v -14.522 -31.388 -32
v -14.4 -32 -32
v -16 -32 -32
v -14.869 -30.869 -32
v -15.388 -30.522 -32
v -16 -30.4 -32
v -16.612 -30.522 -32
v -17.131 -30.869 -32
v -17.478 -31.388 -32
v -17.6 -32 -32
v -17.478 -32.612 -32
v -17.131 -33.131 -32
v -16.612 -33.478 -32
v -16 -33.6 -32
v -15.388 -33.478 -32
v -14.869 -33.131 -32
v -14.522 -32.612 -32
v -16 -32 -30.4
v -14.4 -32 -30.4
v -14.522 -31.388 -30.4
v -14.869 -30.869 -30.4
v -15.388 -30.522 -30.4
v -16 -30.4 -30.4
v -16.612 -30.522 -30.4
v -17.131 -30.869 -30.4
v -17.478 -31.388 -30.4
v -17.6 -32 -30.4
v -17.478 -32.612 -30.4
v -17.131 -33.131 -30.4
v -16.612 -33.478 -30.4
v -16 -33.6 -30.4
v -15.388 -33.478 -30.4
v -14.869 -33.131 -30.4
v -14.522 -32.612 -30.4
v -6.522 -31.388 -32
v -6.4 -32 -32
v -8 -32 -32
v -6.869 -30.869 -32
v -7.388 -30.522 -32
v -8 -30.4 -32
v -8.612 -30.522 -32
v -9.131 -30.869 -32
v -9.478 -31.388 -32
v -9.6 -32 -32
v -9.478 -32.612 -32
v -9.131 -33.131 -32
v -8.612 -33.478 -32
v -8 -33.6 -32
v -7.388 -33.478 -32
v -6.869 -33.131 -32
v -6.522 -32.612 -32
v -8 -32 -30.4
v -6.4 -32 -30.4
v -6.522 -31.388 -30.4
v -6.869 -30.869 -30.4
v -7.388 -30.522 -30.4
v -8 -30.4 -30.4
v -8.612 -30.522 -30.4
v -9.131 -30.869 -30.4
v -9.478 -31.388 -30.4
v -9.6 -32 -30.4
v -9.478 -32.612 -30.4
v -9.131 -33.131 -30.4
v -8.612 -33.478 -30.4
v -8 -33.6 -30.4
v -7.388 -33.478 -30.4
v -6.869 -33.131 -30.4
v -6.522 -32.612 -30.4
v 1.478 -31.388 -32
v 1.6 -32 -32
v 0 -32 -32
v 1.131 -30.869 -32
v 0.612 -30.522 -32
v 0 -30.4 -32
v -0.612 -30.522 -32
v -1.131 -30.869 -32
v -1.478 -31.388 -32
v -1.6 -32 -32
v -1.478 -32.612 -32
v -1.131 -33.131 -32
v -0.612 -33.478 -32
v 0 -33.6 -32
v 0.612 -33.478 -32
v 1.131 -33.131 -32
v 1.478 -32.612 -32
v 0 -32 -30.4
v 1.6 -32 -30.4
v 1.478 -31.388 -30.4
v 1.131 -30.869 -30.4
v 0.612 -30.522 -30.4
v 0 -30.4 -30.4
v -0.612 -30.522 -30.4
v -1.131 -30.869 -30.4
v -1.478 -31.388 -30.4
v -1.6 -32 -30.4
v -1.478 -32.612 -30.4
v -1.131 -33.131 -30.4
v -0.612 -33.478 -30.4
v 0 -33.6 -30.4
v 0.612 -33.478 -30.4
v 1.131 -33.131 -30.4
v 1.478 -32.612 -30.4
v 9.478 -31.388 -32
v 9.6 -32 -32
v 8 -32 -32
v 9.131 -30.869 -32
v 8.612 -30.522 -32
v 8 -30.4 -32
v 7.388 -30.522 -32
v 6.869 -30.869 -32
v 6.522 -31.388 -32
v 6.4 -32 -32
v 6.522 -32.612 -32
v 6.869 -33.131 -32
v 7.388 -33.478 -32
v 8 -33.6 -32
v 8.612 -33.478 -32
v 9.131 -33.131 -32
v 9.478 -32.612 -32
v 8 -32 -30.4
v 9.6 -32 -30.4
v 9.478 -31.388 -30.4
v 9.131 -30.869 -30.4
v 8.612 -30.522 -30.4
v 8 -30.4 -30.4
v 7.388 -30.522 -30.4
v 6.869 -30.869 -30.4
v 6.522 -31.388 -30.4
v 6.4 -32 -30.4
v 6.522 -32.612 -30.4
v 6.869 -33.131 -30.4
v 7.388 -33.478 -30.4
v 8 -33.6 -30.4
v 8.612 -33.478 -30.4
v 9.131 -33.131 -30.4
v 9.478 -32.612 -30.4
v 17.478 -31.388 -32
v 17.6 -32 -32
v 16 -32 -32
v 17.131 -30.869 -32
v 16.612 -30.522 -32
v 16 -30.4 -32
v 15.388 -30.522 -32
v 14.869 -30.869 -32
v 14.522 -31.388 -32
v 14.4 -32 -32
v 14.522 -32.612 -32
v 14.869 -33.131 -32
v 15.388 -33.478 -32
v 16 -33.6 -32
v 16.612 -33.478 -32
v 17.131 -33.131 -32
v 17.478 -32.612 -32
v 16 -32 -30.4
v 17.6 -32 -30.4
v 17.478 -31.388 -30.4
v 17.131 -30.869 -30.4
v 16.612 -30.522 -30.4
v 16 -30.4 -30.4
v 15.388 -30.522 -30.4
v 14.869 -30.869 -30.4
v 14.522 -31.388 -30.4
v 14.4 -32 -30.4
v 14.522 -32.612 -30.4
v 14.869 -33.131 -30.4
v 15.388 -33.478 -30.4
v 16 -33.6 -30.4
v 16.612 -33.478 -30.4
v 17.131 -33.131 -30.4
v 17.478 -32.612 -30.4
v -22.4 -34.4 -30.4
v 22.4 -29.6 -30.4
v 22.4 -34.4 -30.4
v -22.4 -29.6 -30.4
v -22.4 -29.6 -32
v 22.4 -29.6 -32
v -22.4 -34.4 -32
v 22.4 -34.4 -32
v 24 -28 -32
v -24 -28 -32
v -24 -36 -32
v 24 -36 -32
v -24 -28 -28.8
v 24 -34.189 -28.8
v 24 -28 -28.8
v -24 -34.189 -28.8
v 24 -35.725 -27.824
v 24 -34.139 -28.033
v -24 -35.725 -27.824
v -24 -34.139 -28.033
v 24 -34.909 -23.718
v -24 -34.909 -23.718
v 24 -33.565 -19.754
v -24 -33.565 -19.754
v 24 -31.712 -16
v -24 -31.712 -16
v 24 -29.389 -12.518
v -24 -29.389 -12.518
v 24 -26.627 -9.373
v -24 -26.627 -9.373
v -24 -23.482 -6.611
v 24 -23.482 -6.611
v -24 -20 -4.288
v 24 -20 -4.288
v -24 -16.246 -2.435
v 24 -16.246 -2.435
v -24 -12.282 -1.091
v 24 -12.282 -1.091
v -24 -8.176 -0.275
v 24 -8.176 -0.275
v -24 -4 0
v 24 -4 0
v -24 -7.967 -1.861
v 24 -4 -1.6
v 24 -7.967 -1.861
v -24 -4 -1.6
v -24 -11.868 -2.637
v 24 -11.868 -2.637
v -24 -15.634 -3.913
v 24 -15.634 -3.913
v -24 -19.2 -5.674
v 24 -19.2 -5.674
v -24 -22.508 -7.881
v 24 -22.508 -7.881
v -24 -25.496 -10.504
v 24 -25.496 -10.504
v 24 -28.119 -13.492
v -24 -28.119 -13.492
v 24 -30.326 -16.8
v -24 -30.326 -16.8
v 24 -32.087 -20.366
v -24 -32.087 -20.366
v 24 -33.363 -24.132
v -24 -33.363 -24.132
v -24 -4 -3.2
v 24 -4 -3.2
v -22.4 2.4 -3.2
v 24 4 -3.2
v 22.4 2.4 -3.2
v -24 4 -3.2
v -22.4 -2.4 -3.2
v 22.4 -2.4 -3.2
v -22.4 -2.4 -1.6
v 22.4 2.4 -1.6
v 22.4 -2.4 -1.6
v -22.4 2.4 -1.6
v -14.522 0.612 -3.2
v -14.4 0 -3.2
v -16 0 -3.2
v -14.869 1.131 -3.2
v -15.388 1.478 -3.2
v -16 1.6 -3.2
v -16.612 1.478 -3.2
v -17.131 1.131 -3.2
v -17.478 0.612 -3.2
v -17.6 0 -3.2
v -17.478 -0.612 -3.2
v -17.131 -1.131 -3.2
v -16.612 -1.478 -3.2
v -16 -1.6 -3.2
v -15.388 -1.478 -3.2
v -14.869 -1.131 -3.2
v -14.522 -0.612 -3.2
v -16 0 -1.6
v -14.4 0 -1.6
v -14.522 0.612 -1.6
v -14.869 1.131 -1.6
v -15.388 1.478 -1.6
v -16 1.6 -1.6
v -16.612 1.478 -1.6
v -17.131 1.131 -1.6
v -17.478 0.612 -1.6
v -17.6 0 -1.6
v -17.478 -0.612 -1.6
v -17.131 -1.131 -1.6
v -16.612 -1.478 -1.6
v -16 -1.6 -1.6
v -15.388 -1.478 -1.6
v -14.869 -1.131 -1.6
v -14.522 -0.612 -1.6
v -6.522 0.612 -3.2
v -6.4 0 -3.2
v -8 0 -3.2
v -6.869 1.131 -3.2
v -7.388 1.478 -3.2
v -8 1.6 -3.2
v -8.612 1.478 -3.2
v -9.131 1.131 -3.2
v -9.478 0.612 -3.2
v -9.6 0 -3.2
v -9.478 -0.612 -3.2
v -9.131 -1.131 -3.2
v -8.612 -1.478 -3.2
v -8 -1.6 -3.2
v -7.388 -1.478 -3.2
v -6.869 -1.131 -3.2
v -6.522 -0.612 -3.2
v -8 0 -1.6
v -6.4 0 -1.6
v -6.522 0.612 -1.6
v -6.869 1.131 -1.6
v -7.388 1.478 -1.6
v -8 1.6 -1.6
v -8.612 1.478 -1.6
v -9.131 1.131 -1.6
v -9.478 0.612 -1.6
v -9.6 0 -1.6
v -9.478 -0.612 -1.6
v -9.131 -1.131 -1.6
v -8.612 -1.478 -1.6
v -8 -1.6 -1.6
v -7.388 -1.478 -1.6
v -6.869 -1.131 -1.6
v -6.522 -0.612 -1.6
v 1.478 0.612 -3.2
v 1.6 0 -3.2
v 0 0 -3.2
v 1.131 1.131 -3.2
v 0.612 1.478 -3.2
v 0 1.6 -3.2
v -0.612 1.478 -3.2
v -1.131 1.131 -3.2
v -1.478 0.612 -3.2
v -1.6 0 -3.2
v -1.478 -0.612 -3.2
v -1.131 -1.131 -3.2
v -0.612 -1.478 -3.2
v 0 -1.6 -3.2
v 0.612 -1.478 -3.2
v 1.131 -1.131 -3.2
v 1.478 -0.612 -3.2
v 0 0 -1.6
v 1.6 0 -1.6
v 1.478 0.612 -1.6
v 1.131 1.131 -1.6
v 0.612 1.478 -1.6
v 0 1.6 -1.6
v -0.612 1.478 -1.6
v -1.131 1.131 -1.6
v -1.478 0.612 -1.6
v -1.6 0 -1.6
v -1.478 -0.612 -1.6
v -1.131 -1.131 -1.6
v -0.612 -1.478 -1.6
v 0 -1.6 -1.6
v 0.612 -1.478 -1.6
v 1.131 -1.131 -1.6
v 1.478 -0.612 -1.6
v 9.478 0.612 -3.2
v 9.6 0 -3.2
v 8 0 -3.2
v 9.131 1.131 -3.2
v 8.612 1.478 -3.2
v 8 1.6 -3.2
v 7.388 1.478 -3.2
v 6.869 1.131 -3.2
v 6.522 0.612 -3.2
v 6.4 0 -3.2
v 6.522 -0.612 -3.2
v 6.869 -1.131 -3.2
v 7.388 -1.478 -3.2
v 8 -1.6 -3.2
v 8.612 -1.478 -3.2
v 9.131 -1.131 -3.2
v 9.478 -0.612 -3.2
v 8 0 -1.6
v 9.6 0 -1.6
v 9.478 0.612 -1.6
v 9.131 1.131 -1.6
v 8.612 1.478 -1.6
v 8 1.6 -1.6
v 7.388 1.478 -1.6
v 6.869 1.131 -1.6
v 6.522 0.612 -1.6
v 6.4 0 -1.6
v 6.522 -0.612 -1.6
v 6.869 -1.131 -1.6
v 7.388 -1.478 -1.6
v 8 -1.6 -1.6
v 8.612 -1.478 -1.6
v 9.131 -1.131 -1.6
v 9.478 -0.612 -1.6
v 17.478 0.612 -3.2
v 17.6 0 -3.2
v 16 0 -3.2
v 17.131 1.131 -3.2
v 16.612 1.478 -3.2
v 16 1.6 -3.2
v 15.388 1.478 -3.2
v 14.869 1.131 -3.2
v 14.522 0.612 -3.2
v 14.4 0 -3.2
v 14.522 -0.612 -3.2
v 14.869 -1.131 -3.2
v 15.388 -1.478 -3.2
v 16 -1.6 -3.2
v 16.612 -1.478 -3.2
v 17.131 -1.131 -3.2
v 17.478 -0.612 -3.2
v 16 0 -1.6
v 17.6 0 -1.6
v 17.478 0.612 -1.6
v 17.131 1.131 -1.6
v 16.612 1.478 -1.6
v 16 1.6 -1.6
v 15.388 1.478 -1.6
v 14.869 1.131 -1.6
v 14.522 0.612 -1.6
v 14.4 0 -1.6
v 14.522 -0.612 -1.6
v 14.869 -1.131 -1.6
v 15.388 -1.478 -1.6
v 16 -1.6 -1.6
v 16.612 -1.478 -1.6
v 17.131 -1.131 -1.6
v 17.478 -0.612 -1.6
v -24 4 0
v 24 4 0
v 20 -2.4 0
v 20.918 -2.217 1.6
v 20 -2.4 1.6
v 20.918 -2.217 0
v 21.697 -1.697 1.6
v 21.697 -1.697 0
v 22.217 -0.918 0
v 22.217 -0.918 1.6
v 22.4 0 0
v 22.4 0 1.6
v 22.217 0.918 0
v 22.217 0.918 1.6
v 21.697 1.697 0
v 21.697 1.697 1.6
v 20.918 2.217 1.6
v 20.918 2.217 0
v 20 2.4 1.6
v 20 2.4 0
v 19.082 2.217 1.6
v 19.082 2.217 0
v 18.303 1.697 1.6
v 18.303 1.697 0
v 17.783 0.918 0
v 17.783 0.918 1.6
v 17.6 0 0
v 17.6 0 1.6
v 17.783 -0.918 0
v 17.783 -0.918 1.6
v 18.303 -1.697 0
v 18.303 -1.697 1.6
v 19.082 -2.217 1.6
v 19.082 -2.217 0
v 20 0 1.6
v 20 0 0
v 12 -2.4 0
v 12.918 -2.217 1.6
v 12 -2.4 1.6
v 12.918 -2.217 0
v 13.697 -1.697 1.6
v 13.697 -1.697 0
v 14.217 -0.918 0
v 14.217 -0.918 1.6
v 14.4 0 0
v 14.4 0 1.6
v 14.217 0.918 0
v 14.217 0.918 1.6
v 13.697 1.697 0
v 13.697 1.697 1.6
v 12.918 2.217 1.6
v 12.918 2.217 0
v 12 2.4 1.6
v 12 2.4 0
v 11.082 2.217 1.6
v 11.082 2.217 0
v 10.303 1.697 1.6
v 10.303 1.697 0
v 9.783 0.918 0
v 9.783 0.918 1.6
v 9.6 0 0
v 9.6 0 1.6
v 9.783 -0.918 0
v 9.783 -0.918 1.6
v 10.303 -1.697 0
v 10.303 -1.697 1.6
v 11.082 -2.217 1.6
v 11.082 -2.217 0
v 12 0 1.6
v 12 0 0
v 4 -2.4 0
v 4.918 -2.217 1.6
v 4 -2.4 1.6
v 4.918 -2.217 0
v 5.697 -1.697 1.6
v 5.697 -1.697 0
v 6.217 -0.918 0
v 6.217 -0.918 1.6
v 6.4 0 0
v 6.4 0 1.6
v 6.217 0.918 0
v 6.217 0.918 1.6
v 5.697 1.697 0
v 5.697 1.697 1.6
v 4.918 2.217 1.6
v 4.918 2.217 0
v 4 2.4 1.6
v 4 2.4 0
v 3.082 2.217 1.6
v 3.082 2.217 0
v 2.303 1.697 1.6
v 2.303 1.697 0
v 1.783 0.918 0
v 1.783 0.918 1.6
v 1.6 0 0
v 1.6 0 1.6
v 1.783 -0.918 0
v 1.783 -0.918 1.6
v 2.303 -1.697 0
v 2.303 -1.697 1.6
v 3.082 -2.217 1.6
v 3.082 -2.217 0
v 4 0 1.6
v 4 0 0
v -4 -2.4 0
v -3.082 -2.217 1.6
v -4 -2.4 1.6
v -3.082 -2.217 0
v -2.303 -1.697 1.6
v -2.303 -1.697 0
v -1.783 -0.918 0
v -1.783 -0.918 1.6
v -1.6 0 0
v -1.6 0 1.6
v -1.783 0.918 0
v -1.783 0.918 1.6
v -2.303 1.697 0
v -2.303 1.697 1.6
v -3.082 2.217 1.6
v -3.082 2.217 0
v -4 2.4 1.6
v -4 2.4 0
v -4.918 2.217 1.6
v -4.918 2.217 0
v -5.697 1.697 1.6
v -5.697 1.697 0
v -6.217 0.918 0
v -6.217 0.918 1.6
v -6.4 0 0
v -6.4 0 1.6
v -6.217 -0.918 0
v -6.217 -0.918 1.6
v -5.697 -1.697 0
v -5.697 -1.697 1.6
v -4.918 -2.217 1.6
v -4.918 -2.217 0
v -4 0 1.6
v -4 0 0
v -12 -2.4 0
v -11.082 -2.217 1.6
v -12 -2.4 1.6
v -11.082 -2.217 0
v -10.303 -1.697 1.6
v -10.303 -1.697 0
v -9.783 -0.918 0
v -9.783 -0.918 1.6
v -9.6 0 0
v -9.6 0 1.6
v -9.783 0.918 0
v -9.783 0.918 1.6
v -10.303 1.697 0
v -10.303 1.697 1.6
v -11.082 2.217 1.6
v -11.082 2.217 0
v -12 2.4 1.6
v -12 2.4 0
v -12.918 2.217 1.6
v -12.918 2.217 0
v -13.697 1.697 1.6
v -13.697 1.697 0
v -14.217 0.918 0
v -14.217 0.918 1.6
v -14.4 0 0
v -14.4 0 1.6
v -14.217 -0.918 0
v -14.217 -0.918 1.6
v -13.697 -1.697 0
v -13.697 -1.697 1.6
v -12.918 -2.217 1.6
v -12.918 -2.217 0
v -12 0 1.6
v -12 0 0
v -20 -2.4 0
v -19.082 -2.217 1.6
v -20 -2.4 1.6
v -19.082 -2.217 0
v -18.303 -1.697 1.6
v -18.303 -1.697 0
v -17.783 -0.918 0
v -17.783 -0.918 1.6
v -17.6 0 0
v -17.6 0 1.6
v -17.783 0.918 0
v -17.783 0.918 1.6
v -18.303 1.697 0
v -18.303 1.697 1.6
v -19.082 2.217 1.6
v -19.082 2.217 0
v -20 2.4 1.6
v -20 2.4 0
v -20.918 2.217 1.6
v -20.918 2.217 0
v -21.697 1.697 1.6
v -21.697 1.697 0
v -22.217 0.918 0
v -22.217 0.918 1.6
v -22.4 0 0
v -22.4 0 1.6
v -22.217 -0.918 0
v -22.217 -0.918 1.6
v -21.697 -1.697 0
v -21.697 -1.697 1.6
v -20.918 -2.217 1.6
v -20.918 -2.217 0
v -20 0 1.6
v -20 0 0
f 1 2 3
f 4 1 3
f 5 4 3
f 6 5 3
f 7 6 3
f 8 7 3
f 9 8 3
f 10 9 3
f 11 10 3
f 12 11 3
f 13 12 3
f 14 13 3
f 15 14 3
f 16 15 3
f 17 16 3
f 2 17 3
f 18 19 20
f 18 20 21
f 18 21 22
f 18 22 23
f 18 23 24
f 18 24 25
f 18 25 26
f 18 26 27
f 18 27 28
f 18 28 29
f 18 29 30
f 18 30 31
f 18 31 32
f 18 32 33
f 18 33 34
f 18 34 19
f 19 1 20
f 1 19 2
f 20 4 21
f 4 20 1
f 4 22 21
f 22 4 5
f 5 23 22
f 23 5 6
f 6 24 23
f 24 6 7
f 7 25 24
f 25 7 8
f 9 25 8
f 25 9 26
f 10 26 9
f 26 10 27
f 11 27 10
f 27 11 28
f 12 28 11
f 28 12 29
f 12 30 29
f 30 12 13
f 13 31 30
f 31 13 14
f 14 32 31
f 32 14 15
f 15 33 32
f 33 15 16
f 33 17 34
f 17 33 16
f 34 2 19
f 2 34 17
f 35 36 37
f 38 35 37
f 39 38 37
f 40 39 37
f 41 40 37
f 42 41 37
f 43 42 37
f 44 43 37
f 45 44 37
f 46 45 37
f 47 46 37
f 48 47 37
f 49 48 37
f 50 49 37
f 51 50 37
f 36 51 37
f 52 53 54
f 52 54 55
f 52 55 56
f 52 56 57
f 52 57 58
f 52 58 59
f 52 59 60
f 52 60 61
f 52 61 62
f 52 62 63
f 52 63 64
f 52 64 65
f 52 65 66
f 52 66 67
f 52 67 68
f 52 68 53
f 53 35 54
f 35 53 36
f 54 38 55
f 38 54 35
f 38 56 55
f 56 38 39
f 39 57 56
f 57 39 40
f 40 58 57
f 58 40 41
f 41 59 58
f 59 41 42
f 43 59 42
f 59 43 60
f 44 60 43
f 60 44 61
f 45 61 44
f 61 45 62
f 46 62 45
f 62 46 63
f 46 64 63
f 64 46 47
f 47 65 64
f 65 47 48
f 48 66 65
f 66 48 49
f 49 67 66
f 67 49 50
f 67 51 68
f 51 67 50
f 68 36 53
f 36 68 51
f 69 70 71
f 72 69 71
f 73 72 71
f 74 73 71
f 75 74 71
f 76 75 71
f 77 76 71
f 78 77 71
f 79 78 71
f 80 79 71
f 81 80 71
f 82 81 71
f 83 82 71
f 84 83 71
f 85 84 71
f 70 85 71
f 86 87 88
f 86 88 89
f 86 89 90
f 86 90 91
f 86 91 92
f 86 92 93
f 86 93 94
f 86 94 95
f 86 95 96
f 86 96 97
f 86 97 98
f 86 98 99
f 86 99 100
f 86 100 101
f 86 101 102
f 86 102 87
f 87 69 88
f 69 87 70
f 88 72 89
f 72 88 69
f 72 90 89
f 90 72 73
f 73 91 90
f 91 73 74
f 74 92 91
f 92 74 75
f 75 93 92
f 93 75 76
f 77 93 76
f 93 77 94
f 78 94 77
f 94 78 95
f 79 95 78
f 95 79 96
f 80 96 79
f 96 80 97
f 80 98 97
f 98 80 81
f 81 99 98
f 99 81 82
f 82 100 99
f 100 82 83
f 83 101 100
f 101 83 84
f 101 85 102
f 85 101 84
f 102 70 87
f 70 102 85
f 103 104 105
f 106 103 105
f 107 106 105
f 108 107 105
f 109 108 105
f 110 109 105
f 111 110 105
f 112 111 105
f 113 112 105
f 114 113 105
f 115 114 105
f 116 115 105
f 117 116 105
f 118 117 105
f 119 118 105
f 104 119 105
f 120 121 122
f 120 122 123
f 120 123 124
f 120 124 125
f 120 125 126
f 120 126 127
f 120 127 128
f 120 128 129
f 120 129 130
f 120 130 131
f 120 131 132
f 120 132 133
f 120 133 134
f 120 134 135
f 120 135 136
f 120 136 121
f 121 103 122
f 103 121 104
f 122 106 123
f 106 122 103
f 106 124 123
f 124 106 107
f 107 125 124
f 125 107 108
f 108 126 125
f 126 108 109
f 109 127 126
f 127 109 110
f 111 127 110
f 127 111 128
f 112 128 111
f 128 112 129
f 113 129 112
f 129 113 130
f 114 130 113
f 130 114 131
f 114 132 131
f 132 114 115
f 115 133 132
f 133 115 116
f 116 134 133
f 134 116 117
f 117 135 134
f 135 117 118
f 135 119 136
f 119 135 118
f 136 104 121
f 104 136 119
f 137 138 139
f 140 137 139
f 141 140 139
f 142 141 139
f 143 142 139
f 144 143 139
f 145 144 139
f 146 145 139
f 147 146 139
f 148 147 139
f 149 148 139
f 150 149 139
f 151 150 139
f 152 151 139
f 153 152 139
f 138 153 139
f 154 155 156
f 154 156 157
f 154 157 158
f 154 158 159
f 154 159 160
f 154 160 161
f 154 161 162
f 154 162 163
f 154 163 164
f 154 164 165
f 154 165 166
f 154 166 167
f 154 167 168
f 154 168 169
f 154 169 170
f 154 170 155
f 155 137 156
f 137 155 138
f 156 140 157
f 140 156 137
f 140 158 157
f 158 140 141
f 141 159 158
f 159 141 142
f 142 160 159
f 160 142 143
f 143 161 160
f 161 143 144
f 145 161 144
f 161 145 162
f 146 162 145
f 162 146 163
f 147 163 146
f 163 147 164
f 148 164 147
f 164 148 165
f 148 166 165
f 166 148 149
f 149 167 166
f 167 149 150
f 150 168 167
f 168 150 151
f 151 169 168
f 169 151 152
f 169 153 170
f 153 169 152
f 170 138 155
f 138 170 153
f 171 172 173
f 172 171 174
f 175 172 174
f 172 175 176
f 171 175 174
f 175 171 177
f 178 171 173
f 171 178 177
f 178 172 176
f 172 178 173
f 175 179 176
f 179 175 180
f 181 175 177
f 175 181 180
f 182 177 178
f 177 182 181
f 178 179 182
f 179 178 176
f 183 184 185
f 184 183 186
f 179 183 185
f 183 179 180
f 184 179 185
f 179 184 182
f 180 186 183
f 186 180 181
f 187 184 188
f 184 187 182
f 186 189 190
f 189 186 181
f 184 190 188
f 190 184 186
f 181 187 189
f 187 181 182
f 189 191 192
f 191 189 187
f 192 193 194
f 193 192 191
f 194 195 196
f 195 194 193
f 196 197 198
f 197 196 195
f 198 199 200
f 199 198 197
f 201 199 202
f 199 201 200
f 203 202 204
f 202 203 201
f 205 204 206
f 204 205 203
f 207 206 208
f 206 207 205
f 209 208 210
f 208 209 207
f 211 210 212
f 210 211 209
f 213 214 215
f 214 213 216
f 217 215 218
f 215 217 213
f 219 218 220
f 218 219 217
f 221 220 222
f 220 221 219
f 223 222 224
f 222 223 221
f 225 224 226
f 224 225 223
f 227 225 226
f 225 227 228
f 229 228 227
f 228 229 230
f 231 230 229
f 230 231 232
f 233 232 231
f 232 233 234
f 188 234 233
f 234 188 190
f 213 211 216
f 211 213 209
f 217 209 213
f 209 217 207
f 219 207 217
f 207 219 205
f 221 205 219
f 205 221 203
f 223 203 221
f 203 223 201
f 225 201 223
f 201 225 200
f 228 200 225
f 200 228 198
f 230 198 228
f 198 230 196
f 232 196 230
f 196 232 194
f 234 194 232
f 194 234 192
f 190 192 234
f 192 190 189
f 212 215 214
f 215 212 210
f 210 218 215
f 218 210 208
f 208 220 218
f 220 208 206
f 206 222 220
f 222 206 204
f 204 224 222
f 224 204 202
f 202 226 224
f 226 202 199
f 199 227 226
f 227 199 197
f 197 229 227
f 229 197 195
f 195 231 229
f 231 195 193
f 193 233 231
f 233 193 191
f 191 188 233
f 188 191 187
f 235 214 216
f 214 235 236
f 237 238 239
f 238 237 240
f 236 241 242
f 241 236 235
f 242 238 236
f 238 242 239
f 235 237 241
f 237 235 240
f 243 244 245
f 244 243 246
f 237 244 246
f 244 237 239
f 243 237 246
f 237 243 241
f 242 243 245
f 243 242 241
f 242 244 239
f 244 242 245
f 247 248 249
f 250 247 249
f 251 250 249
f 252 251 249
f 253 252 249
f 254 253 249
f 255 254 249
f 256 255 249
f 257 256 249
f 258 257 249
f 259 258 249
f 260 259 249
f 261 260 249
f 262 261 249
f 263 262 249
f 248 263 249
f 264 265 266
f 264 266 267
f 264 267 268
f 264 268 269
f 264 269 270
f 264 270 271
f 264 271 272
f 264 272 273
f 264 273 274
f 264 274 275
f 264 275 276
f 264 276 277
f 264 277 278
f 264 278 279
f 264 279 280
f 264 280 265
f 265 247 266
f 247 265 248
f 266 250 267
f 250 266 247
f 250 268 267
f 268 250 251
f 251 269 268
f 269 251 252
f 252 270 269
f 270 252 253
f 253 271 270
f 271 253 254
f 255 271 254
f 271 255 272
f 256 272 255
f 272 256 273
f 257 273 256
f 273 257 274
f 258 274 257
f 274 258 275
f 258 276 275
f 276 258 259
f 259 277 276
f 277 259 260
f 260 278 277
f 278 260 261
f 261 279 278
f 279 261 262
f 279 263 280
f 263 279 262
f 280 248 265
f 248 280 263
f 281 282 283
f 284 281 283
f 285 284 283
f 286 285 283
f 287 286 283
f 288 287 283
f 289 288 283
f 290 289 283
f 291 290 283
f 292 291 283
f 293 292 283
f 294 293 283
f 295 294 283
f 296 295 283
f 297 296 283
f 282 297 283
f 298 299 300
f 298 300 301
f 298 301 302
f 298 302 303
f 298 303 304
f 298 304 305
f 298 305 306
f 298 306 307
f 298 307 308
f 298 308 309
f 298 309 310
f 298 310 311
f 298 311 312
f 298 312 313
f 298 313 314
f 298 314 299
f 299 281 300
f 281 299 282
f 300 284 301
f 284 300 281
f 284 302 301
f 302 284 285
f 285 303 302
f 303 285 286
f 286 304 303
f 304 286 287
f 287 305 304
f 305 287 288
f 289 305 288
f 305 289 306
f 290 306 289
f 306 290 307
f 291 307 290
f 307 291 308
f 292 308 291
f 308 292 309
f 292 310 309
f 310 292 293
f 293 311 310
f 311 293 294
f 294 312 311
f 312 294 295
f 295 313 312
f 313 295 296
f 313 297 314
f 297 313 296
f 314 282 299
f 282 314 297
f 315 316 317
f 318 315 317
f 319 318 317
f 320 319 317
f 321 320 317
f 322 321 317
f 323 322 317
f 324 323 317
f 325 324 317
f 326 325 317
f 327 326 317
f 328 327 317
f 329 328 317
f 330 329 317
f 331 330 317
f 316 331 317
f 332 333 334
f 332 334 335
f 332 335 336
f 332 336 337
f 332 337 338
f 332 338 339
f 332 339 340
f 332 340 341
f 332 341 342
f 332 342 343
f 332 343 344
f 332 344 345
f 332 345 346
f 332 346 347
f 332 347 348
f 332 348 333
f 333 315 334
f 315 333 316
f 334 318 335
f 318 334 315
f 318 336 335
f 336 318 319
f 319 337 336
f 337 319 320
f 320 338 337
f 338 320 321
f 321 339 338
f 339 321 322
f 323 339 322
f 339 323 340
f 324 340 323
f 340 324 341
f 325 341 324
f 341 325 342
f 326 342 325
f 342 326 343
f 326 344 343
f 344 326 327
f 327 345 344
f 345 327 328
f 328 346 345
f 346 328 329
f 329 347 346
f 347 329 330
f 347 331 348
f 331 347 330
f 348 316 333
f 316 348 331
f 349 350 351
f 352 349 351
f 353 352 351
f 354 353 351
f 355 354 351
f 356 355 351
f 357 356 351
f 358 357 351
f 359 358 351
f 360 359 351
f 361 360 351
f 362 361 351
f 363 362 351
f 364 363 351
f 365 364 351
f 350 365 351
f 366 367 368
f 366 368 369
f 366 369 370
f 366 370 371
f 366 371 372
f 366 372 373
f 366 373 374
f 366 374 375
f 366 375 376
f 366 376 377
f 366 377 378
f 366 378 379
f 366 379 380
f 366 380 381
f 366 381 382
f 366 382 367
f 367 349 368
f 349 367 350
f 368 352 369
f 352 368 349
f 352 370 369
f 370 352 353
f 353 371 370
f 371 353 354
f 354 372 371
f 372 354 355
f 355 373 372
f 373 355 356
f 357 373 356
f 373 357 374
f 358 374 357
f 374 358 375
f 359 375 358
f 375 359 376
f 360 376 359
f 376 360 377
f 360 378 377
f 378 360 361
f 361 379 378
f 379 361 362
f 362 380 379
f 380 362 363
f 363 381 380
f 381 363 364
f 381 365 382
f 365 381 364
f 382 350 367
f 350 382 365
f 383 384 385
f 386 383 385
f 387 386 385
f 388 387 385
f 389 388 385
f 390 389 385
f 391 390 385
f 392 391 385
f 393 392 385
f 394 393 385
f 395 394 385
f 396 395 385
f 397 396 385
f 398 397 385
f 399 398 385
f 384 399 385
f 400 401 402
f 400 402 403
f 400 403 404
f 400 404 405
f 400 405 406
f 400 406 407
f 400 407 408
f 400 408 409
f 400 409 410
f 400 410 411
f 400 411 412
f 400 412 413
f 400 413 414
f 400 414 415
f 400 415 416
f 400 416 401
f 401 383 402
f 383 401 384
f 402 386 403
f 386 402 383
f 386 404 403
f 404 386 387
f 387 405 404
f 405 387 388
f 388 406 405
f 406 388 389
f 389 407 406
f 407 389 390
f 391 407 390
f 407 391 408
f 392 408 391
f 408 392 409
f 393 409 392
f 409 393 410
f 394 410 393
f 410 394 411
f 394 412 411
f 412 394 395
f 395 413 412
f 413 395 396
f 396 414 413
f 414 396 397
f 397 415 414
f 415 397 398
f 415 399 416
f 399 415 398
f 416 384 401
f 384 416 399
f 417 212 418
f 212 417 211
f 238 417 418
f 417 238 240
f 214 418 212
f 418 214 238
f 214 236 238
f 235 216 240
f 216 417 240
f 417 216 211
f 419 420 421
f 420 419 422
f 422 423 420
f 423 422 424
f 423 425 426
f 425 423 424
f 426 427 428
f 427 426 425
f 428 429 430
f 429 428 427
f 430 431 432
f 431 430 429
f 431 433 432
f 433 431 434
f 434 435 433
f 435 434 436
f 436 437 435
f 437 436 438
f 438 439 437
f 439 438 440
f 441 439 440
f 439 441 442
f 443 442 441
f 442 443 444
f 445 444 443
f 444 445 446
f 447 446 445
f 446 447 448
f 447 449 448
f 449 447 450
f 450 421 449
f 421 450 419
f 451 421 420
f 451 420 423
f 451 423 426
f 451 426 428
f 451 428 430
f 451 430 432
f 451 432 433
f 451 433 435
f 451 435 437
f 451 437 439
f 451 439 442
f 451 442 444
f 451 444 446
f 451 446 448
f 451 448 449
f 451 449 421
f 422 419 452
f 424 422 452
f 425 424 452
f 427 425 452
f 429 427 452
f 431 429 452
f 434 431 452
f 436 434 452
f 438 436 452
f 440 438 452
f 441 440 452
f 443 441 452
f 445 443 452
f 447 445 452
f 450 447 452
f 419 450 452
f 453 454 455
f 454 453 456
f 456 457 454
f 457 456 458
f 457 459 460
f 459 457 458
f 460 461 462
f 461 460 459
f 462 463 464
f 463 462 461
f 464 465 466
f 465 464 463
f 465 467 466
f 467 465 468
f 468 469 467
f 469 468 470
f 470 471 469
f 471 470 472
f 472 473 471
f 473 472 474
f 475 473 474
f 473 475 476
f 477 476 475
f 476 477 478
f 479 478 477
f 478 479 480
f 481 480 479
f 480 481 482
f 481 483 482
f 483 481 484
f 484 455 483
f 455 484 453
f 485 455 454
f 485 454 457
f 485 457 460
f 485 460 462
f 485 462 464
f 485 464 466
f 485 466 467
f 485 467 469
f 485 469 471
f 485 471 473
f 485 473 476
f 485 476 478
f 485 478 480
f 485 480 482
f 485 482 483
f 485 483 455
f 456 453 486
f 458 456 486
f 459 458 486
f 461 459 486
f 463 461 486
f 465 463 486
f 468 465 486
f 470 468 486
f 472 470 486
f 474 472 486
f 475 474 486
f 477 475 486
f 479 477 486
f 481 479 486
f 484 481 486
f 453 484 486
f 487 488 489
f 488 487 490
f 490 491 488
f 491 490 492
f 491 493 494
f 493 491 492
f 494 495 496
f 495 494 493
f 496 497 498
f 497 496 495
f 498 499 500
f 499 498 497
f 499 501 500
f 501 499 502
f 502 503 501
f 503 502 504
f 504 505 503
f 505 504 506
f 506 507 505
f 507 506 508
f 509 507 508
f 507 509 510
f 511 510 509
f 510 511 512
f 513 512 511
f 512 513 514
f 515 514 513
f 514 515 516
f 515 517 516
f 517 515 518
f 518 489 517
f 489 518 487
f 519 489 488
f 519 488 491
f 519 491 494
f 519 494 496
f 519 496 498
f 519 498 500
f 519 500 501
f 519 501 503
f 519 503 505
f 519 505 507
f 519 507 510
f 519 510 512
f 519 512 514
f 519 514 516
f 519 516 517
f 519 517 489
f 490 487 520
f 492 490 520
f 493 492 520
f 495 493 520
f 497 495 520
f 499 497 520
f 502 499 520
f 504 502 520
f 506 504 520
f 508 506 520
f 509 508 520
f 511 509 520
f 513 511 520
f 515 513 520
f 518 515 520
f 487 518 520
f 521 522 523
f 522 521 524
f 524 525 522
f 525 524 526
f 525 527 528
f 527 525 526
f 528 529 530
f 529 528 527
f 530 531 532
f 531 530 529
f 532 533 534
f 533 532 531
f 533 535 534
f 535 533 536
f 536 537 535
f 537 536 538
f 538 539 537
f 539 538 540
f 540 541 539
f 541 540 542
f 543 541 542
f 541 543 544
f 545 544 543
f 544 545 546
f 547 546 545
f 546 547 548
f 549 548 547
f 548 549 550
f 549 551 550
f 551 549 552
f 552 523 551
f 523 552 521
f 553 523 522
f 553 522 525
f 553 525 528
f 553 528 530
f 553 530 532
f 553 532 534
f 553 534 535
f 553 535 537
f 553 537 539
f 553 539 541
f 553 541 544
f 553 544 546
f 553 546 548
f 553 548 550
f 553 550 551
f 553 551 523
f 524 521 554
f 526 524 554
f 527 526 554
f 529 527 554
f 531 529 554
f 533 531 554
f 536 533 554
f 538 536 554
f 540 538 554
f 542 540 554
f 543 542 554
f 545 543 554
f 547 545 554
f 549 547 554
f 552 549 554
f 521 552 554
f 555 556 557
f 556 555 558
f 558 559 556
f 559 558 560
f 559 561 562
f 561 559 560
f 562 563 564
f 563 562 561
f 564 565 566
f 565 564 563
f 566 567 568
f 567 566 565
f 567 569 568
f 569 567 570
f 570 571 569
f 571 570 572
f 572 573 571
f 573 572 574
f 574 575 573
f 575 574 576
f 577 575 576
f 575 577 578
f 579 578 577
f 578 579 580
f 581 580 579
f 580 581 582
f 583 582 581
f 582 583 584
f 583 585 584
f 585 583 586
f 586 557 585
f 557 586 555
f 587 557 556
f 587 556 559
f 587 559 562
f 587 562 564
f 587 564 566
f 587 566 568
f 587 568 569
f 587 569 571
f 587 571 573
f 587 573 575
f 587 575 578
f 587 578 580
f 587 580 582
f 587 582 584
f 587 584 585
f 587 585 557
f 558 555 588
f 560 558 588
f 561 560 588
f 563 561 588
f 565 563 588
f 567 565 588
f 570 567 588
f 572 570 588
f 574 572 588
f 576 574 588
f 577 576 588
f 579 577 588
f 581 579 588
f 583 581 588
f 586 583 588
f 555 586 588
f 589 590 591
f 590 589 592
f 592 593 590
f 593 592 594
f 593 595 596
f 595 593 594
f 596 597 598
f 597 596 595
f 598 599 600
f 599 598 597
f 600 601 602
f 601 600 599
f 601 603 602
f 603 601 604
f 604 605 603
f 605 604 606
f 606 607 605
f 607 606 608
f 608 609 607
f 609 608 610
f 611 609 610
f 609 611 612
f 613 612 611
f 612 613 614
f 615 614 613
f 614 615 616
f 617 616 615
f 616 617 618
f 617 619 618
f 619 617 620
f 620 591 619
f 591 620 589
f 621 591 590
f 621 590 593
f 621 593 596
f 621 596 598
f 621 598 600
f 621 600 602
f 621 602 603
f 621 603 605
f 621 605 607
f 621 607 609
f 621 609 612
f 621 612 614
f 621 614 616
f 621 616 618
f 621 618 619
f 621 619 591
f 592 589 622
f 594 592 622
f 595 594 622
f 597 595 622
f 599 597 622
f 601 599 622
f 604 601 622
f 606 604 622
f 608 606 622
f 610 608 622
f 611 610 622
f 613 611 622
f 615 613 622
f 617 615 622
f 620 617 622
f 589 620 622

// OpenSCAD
use <../lib.scad>
use <../p/48/1-4cylo.scad>
use <../p/48/11-48cylo.scad>
use <../p/48/11-48ring19.scad>
use <../p/box2-7.scad>
use <../p/box5.scad>
use <../p/rect.scad>
use <../p/rect2p.scad>
use <../p/rect3.scad>
use <../p/recte4.scad>
use <../p/stug-6x1.scad>
use <../p/stug3-1x5.scad>
function ldraw_lib__5065() = [
// 0 Panel  6 x  5 x  3.333 with Curved Top
// 0 Name: 5065.dat
// 0 Author: Gerald Lasser [GeraldLasser]
// 0 !LDRAW_ORG Part UPDATE 2023-07
// 0 !LICENSE Licensed under CC BY 4.0 : see CAreadme.txt
// 
// 0 BFC CERTIFY CCW
  [0,"BFC","CERTIFY"],
  [0,"BFC","CCW"],
// 
// 0 !HISTORY 2023-12-31 [OrionP] Official Update 2023-07
// 
// 0 // Bottom
// 1 16 0 76 -80 1 0 0 0 -1 0 0 0 1 stug3-1x5.dat
  [1,16,0,76,-80,1,0,0,0,-1,0,0,0,1, ldraw_lib__stug3_1x5()],
// 0 BFC INVERTNEXT
  [0,"BFC","INVERTNEXT"],
// 1 16 0 80 -80 56 0 0 0 -4 0 0 0 6 box5.dat
  [1,16,0,80,-80,56,0,0,0,-4,0,0,0,6, ldraw_lib__box5()],
// 4 16 60 80 -70 56 80 -74 -56 80 -74 -60 80 -70
  [4,16,60,80,-70,56,80,-74,-56,80,-74,-60,80,-70],
// 4 16 -60 80 -70 -56 80 -74 -56 80 -86 -60 80 -90
  [4,16,-60,80,-70,-56,80,-74,-56,80,-86,-60,80,-90],
// 4 16 -60 80 -90 -56 80 -86 56 80 -86 60 80 -90
  [4,16,-60,80,-90,-56,80,-86,56,80,-86,60,80,-90],
// 4 16 60 80 -90 56 80 -86 56 80 -74 60 80 -70
  [4,16,60,80,-90,56,80,-86,56,80,-74,60,80,-70],
// 1 16 0 80 -80 60 0 0 0 1 0 0 0 10 recte4.dat
  [1,16,0,80,-80,60,0,0,0,1,0,0,0,10, ldraw_lib__recte4()],
// 
// 1 16 0 72 -77.7364 60 0 0 0 1 0 0 0 7.7364 rect.dat
  [1,16,0,72,-77.7364,60,0,0,0,1,0,0,0,7.7364, ldraw_lib__rect()],
// 1 16 0 76 -70 0 0 60 -4 0 0 0 -1 0 rect2p.dat
  [1,16,0,76,-70,0,0,60,-4,0,0,0,-1,0, ldraw_lib__rect2p()],
// 
// 4 16 60 80 -70 60 72 -70 60 72 -85.4728 60 80 -90
  [4,16,60,80,-70,60,72,-70,60,72,-85.4728,60,80,-90],
// 4 16 -60 80 -70 -60 80 -90 -60 72 -85.4728 -60 72 -70
  [4,16,-60,80,-70,-60,80,-90,-60,72,-85.4728,-60,72,-70],
// 4 16 60 72 -85.4728 60 70.082 -85.3464 60 69.56 -89.312 60 80 -90
  [4,16,60,72,-85.4728,60,70.082,-85.3464,60,69.56,-89.312,60,80,-90],
// 4 16 -60 69.56 -89.312 -60 70.082 -85.3464 -60 72 -85.4728 -60 80 -90
  [4,16,-60,69.56,-89.312,-60,70.082,-85.3464,-60,72,-85.4728,-60,80,-90],
// 4 16 -60 72 -85.4728 -60 70.082 -85.3464 60 70.082 -85.3464 60 72 -85.4728
  [4,16,-60,72,-85.4728,-60,70.082,-85.3464,60,70.082,-85.3464,60,72,-85.4728],
// 2 24 60 70.082 -85.3464 60 72 -85.4728
  [2,24,60,70.082,-85.3464,60,72,-85.4728],
// 2 24 -60 70.082 -85.3464 -60 72 -85.4728
  [2,24,-60,70.082,-85.3464,-60,72,-85.4728],
// 5 24 -60 70.082 -85.3464 60 70.082 -85.3464 60 72 -85.4728 60 60.3312 -83.4084
  [5,24,-60,70.082,-85.3464,60,70.082,-85.3464,60,72,-85.4728,60,60.3312,-83.4084],
// 
// 1 16 -60 80 -10 0 120 0 0 0 -80 -80 0 0 48\1-4cylo.dat
  [1,16,-60,80,-10,0,120,0,0,0,-80,-80,0,0, ldraw_lib__48__1_4cylo()],
// 0 BFC INVERTNEXT
  [0,"BFC","INVERTNEXT"],
// 1 16 -60 80 -10 0 120 0 -76 0 0 0 0 -76 48\11-48cylo.dat
  [1,16,-60,80,-10,0,120,0,-76,0,0,0,0,-76, ldraw_lib__48__11_48cylo()],
// 1 16 -60 80 -10 0 1 0 -4 0 0 0 0 -4 48\11-48ring19.dat
  [1,16,-60,80,-10,0,1,0,-4,0,0,0,0,-4, ldraw_lib__48__11_48ring19()],
// 1 16 60 80 -10 0 -1 0 -4 0 0 0 0 -4 48\11-48ring19.dat
  [1,16,60,80,-10,0,-1,0,-4,0,0,0,0,-4, ldraw_lib__48__11_48ring19()],
// 
// 0 // Top
// 1 16 0 6 -10 -60 0 0 0 0 -2 0 1 0 rect3.dat
  [1,16,0,6,-10,-60,0,0,0,0,-2,0,1,0, ldraw_lib__rect3()],
// 1 16 0 8 0 60 0 0 0 1 0 0 0 10 recte4.dat
  [1,16,0,8,0,60,0,0,0,1,0,0,0,10, ldraw_lib__recte4()],
// 4 16 60 8 10 56 8 6 -56 8 6 -60 8 10
  [4,16,60,8,10,56,8,6,-56,8,6,-60,8,10],
// 4 16 60 8 -10 -60 8 -10 -56 8 -6 56 8 -6
  [4,16,60,8,-10,-60,8,-10,-56,8,-6,56,8,-6],
// 4 16 60 8 10 60 8 -10 56 8 -6 56 8 6
  [4,16,60,8,10,60,8,-10,56,8,-6,56,8,6],
// 4 16 -60 8 10 -56 8 6 -56 8 -6 -60 8 -10
  [4,16,-60,8,10,-56,8,6,-56,8,-6,-60,8,-10],
// 0 BFC INVERTNEXT
  [0,"BFC","INVERTNEXT"],
// 1 16 0 8 0 56 0 0 0 -4 0 0 0 6 box5.dat
  [1,16,0,8,0,56,0,0,0,-4,0,0,0,6, ldraw_lib__box5()],
// 1 16 0 4 0 1 0 0 0 -1 0 0 0 1 stug3-1x5.dat
  [1,16,0,4,0,1,0,0,0,-1,0,0,0,1, ldraw_lib__stug3_1x5()],
// 1 16 0 4 0 60 0 0 0 -4 0 0 0 10 box2-7.dat
  [1,16,0,4,0,60,0,0,0,-4,0,0,0,10, ldraw_lib__box2_7()],
// 4 16 60 0 10 60 0 -10 60 4 -10 60 8 10
  [4,16,60,0,10,60,0,-10,60,4,-10,60,8,10],
// 3 16 60 4 -10 60 8 -10 60 8 10
  [3,16,60,4,-10,60,8,-10,60,8,10],
// 3 16 -60 8 -10 -60 4 -10 -60 8 10
  [3,16,-60,8,-10,-60,4,-10,-60,8,10],
// 4 16 -60 4 -10 -60 0 -10 -60 0 10 -60 8 10
  [4,16,-60,4,-10,-60,0,-10,-60,0,10,-60,8,10],
// 
// 1 16 0 0 0 0 0 1 0 1 0 -1 0 0 stug-6x1.dat
  [1,16,0,0,0,0,0,1,0,1,0,-1,0,0, ldraw_lib__stug_6x1()],
];
module ldraw_lib__5065(step=0, col=false, unit=2/5, alt=false, line=0.2, solid=!$preview)
    makepoly(ldraw_lib__5065(), step=step, col=col, unit=unit, alt=alt, line=line, solid=solid);
ldraw_lib__5065(line=0.2);
